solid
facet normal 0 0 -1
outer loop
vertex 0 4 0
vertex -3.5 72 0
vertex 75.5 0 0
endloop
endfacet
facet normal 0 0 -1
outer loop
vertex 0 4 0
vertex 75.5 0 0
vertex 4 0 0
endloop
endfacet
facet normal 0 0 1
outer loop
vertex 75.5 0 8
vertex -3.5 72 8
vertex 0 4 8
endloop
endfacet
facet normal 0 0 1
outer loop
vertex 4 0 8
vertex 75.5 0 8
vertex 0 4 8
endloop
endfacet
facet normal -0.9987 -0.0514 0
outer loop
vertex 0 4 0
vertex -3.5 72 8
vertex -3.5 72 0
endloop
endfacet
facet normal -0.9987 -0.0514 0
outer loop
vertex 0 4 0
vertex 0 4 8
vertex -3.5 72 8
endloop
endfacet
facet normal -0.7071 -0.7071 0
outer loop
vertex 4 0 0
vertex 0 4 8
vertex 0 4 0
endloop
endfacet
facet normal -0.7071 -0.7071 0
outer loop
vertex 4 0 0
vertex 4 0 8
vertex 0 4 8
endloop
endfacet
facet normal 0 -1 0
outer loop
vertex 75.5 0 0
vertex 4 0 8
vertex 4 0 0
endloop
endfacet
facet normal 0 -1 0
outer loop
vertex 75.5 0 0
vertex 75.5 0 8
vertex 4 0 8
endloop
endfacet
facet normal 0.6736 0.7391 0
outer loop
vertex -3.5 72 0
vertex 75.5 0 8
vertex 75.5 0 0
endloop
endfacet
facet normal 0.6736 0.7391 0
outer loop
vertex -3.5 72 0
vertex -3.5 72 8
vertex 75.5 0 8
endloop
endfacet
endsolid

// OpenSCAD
a=4;
b=8;
c=72;
d=3.5;

linear_extrude(height=b)
    polygon(points=[[0,a], [a,0], [c+d,0], [-d,c]]);
